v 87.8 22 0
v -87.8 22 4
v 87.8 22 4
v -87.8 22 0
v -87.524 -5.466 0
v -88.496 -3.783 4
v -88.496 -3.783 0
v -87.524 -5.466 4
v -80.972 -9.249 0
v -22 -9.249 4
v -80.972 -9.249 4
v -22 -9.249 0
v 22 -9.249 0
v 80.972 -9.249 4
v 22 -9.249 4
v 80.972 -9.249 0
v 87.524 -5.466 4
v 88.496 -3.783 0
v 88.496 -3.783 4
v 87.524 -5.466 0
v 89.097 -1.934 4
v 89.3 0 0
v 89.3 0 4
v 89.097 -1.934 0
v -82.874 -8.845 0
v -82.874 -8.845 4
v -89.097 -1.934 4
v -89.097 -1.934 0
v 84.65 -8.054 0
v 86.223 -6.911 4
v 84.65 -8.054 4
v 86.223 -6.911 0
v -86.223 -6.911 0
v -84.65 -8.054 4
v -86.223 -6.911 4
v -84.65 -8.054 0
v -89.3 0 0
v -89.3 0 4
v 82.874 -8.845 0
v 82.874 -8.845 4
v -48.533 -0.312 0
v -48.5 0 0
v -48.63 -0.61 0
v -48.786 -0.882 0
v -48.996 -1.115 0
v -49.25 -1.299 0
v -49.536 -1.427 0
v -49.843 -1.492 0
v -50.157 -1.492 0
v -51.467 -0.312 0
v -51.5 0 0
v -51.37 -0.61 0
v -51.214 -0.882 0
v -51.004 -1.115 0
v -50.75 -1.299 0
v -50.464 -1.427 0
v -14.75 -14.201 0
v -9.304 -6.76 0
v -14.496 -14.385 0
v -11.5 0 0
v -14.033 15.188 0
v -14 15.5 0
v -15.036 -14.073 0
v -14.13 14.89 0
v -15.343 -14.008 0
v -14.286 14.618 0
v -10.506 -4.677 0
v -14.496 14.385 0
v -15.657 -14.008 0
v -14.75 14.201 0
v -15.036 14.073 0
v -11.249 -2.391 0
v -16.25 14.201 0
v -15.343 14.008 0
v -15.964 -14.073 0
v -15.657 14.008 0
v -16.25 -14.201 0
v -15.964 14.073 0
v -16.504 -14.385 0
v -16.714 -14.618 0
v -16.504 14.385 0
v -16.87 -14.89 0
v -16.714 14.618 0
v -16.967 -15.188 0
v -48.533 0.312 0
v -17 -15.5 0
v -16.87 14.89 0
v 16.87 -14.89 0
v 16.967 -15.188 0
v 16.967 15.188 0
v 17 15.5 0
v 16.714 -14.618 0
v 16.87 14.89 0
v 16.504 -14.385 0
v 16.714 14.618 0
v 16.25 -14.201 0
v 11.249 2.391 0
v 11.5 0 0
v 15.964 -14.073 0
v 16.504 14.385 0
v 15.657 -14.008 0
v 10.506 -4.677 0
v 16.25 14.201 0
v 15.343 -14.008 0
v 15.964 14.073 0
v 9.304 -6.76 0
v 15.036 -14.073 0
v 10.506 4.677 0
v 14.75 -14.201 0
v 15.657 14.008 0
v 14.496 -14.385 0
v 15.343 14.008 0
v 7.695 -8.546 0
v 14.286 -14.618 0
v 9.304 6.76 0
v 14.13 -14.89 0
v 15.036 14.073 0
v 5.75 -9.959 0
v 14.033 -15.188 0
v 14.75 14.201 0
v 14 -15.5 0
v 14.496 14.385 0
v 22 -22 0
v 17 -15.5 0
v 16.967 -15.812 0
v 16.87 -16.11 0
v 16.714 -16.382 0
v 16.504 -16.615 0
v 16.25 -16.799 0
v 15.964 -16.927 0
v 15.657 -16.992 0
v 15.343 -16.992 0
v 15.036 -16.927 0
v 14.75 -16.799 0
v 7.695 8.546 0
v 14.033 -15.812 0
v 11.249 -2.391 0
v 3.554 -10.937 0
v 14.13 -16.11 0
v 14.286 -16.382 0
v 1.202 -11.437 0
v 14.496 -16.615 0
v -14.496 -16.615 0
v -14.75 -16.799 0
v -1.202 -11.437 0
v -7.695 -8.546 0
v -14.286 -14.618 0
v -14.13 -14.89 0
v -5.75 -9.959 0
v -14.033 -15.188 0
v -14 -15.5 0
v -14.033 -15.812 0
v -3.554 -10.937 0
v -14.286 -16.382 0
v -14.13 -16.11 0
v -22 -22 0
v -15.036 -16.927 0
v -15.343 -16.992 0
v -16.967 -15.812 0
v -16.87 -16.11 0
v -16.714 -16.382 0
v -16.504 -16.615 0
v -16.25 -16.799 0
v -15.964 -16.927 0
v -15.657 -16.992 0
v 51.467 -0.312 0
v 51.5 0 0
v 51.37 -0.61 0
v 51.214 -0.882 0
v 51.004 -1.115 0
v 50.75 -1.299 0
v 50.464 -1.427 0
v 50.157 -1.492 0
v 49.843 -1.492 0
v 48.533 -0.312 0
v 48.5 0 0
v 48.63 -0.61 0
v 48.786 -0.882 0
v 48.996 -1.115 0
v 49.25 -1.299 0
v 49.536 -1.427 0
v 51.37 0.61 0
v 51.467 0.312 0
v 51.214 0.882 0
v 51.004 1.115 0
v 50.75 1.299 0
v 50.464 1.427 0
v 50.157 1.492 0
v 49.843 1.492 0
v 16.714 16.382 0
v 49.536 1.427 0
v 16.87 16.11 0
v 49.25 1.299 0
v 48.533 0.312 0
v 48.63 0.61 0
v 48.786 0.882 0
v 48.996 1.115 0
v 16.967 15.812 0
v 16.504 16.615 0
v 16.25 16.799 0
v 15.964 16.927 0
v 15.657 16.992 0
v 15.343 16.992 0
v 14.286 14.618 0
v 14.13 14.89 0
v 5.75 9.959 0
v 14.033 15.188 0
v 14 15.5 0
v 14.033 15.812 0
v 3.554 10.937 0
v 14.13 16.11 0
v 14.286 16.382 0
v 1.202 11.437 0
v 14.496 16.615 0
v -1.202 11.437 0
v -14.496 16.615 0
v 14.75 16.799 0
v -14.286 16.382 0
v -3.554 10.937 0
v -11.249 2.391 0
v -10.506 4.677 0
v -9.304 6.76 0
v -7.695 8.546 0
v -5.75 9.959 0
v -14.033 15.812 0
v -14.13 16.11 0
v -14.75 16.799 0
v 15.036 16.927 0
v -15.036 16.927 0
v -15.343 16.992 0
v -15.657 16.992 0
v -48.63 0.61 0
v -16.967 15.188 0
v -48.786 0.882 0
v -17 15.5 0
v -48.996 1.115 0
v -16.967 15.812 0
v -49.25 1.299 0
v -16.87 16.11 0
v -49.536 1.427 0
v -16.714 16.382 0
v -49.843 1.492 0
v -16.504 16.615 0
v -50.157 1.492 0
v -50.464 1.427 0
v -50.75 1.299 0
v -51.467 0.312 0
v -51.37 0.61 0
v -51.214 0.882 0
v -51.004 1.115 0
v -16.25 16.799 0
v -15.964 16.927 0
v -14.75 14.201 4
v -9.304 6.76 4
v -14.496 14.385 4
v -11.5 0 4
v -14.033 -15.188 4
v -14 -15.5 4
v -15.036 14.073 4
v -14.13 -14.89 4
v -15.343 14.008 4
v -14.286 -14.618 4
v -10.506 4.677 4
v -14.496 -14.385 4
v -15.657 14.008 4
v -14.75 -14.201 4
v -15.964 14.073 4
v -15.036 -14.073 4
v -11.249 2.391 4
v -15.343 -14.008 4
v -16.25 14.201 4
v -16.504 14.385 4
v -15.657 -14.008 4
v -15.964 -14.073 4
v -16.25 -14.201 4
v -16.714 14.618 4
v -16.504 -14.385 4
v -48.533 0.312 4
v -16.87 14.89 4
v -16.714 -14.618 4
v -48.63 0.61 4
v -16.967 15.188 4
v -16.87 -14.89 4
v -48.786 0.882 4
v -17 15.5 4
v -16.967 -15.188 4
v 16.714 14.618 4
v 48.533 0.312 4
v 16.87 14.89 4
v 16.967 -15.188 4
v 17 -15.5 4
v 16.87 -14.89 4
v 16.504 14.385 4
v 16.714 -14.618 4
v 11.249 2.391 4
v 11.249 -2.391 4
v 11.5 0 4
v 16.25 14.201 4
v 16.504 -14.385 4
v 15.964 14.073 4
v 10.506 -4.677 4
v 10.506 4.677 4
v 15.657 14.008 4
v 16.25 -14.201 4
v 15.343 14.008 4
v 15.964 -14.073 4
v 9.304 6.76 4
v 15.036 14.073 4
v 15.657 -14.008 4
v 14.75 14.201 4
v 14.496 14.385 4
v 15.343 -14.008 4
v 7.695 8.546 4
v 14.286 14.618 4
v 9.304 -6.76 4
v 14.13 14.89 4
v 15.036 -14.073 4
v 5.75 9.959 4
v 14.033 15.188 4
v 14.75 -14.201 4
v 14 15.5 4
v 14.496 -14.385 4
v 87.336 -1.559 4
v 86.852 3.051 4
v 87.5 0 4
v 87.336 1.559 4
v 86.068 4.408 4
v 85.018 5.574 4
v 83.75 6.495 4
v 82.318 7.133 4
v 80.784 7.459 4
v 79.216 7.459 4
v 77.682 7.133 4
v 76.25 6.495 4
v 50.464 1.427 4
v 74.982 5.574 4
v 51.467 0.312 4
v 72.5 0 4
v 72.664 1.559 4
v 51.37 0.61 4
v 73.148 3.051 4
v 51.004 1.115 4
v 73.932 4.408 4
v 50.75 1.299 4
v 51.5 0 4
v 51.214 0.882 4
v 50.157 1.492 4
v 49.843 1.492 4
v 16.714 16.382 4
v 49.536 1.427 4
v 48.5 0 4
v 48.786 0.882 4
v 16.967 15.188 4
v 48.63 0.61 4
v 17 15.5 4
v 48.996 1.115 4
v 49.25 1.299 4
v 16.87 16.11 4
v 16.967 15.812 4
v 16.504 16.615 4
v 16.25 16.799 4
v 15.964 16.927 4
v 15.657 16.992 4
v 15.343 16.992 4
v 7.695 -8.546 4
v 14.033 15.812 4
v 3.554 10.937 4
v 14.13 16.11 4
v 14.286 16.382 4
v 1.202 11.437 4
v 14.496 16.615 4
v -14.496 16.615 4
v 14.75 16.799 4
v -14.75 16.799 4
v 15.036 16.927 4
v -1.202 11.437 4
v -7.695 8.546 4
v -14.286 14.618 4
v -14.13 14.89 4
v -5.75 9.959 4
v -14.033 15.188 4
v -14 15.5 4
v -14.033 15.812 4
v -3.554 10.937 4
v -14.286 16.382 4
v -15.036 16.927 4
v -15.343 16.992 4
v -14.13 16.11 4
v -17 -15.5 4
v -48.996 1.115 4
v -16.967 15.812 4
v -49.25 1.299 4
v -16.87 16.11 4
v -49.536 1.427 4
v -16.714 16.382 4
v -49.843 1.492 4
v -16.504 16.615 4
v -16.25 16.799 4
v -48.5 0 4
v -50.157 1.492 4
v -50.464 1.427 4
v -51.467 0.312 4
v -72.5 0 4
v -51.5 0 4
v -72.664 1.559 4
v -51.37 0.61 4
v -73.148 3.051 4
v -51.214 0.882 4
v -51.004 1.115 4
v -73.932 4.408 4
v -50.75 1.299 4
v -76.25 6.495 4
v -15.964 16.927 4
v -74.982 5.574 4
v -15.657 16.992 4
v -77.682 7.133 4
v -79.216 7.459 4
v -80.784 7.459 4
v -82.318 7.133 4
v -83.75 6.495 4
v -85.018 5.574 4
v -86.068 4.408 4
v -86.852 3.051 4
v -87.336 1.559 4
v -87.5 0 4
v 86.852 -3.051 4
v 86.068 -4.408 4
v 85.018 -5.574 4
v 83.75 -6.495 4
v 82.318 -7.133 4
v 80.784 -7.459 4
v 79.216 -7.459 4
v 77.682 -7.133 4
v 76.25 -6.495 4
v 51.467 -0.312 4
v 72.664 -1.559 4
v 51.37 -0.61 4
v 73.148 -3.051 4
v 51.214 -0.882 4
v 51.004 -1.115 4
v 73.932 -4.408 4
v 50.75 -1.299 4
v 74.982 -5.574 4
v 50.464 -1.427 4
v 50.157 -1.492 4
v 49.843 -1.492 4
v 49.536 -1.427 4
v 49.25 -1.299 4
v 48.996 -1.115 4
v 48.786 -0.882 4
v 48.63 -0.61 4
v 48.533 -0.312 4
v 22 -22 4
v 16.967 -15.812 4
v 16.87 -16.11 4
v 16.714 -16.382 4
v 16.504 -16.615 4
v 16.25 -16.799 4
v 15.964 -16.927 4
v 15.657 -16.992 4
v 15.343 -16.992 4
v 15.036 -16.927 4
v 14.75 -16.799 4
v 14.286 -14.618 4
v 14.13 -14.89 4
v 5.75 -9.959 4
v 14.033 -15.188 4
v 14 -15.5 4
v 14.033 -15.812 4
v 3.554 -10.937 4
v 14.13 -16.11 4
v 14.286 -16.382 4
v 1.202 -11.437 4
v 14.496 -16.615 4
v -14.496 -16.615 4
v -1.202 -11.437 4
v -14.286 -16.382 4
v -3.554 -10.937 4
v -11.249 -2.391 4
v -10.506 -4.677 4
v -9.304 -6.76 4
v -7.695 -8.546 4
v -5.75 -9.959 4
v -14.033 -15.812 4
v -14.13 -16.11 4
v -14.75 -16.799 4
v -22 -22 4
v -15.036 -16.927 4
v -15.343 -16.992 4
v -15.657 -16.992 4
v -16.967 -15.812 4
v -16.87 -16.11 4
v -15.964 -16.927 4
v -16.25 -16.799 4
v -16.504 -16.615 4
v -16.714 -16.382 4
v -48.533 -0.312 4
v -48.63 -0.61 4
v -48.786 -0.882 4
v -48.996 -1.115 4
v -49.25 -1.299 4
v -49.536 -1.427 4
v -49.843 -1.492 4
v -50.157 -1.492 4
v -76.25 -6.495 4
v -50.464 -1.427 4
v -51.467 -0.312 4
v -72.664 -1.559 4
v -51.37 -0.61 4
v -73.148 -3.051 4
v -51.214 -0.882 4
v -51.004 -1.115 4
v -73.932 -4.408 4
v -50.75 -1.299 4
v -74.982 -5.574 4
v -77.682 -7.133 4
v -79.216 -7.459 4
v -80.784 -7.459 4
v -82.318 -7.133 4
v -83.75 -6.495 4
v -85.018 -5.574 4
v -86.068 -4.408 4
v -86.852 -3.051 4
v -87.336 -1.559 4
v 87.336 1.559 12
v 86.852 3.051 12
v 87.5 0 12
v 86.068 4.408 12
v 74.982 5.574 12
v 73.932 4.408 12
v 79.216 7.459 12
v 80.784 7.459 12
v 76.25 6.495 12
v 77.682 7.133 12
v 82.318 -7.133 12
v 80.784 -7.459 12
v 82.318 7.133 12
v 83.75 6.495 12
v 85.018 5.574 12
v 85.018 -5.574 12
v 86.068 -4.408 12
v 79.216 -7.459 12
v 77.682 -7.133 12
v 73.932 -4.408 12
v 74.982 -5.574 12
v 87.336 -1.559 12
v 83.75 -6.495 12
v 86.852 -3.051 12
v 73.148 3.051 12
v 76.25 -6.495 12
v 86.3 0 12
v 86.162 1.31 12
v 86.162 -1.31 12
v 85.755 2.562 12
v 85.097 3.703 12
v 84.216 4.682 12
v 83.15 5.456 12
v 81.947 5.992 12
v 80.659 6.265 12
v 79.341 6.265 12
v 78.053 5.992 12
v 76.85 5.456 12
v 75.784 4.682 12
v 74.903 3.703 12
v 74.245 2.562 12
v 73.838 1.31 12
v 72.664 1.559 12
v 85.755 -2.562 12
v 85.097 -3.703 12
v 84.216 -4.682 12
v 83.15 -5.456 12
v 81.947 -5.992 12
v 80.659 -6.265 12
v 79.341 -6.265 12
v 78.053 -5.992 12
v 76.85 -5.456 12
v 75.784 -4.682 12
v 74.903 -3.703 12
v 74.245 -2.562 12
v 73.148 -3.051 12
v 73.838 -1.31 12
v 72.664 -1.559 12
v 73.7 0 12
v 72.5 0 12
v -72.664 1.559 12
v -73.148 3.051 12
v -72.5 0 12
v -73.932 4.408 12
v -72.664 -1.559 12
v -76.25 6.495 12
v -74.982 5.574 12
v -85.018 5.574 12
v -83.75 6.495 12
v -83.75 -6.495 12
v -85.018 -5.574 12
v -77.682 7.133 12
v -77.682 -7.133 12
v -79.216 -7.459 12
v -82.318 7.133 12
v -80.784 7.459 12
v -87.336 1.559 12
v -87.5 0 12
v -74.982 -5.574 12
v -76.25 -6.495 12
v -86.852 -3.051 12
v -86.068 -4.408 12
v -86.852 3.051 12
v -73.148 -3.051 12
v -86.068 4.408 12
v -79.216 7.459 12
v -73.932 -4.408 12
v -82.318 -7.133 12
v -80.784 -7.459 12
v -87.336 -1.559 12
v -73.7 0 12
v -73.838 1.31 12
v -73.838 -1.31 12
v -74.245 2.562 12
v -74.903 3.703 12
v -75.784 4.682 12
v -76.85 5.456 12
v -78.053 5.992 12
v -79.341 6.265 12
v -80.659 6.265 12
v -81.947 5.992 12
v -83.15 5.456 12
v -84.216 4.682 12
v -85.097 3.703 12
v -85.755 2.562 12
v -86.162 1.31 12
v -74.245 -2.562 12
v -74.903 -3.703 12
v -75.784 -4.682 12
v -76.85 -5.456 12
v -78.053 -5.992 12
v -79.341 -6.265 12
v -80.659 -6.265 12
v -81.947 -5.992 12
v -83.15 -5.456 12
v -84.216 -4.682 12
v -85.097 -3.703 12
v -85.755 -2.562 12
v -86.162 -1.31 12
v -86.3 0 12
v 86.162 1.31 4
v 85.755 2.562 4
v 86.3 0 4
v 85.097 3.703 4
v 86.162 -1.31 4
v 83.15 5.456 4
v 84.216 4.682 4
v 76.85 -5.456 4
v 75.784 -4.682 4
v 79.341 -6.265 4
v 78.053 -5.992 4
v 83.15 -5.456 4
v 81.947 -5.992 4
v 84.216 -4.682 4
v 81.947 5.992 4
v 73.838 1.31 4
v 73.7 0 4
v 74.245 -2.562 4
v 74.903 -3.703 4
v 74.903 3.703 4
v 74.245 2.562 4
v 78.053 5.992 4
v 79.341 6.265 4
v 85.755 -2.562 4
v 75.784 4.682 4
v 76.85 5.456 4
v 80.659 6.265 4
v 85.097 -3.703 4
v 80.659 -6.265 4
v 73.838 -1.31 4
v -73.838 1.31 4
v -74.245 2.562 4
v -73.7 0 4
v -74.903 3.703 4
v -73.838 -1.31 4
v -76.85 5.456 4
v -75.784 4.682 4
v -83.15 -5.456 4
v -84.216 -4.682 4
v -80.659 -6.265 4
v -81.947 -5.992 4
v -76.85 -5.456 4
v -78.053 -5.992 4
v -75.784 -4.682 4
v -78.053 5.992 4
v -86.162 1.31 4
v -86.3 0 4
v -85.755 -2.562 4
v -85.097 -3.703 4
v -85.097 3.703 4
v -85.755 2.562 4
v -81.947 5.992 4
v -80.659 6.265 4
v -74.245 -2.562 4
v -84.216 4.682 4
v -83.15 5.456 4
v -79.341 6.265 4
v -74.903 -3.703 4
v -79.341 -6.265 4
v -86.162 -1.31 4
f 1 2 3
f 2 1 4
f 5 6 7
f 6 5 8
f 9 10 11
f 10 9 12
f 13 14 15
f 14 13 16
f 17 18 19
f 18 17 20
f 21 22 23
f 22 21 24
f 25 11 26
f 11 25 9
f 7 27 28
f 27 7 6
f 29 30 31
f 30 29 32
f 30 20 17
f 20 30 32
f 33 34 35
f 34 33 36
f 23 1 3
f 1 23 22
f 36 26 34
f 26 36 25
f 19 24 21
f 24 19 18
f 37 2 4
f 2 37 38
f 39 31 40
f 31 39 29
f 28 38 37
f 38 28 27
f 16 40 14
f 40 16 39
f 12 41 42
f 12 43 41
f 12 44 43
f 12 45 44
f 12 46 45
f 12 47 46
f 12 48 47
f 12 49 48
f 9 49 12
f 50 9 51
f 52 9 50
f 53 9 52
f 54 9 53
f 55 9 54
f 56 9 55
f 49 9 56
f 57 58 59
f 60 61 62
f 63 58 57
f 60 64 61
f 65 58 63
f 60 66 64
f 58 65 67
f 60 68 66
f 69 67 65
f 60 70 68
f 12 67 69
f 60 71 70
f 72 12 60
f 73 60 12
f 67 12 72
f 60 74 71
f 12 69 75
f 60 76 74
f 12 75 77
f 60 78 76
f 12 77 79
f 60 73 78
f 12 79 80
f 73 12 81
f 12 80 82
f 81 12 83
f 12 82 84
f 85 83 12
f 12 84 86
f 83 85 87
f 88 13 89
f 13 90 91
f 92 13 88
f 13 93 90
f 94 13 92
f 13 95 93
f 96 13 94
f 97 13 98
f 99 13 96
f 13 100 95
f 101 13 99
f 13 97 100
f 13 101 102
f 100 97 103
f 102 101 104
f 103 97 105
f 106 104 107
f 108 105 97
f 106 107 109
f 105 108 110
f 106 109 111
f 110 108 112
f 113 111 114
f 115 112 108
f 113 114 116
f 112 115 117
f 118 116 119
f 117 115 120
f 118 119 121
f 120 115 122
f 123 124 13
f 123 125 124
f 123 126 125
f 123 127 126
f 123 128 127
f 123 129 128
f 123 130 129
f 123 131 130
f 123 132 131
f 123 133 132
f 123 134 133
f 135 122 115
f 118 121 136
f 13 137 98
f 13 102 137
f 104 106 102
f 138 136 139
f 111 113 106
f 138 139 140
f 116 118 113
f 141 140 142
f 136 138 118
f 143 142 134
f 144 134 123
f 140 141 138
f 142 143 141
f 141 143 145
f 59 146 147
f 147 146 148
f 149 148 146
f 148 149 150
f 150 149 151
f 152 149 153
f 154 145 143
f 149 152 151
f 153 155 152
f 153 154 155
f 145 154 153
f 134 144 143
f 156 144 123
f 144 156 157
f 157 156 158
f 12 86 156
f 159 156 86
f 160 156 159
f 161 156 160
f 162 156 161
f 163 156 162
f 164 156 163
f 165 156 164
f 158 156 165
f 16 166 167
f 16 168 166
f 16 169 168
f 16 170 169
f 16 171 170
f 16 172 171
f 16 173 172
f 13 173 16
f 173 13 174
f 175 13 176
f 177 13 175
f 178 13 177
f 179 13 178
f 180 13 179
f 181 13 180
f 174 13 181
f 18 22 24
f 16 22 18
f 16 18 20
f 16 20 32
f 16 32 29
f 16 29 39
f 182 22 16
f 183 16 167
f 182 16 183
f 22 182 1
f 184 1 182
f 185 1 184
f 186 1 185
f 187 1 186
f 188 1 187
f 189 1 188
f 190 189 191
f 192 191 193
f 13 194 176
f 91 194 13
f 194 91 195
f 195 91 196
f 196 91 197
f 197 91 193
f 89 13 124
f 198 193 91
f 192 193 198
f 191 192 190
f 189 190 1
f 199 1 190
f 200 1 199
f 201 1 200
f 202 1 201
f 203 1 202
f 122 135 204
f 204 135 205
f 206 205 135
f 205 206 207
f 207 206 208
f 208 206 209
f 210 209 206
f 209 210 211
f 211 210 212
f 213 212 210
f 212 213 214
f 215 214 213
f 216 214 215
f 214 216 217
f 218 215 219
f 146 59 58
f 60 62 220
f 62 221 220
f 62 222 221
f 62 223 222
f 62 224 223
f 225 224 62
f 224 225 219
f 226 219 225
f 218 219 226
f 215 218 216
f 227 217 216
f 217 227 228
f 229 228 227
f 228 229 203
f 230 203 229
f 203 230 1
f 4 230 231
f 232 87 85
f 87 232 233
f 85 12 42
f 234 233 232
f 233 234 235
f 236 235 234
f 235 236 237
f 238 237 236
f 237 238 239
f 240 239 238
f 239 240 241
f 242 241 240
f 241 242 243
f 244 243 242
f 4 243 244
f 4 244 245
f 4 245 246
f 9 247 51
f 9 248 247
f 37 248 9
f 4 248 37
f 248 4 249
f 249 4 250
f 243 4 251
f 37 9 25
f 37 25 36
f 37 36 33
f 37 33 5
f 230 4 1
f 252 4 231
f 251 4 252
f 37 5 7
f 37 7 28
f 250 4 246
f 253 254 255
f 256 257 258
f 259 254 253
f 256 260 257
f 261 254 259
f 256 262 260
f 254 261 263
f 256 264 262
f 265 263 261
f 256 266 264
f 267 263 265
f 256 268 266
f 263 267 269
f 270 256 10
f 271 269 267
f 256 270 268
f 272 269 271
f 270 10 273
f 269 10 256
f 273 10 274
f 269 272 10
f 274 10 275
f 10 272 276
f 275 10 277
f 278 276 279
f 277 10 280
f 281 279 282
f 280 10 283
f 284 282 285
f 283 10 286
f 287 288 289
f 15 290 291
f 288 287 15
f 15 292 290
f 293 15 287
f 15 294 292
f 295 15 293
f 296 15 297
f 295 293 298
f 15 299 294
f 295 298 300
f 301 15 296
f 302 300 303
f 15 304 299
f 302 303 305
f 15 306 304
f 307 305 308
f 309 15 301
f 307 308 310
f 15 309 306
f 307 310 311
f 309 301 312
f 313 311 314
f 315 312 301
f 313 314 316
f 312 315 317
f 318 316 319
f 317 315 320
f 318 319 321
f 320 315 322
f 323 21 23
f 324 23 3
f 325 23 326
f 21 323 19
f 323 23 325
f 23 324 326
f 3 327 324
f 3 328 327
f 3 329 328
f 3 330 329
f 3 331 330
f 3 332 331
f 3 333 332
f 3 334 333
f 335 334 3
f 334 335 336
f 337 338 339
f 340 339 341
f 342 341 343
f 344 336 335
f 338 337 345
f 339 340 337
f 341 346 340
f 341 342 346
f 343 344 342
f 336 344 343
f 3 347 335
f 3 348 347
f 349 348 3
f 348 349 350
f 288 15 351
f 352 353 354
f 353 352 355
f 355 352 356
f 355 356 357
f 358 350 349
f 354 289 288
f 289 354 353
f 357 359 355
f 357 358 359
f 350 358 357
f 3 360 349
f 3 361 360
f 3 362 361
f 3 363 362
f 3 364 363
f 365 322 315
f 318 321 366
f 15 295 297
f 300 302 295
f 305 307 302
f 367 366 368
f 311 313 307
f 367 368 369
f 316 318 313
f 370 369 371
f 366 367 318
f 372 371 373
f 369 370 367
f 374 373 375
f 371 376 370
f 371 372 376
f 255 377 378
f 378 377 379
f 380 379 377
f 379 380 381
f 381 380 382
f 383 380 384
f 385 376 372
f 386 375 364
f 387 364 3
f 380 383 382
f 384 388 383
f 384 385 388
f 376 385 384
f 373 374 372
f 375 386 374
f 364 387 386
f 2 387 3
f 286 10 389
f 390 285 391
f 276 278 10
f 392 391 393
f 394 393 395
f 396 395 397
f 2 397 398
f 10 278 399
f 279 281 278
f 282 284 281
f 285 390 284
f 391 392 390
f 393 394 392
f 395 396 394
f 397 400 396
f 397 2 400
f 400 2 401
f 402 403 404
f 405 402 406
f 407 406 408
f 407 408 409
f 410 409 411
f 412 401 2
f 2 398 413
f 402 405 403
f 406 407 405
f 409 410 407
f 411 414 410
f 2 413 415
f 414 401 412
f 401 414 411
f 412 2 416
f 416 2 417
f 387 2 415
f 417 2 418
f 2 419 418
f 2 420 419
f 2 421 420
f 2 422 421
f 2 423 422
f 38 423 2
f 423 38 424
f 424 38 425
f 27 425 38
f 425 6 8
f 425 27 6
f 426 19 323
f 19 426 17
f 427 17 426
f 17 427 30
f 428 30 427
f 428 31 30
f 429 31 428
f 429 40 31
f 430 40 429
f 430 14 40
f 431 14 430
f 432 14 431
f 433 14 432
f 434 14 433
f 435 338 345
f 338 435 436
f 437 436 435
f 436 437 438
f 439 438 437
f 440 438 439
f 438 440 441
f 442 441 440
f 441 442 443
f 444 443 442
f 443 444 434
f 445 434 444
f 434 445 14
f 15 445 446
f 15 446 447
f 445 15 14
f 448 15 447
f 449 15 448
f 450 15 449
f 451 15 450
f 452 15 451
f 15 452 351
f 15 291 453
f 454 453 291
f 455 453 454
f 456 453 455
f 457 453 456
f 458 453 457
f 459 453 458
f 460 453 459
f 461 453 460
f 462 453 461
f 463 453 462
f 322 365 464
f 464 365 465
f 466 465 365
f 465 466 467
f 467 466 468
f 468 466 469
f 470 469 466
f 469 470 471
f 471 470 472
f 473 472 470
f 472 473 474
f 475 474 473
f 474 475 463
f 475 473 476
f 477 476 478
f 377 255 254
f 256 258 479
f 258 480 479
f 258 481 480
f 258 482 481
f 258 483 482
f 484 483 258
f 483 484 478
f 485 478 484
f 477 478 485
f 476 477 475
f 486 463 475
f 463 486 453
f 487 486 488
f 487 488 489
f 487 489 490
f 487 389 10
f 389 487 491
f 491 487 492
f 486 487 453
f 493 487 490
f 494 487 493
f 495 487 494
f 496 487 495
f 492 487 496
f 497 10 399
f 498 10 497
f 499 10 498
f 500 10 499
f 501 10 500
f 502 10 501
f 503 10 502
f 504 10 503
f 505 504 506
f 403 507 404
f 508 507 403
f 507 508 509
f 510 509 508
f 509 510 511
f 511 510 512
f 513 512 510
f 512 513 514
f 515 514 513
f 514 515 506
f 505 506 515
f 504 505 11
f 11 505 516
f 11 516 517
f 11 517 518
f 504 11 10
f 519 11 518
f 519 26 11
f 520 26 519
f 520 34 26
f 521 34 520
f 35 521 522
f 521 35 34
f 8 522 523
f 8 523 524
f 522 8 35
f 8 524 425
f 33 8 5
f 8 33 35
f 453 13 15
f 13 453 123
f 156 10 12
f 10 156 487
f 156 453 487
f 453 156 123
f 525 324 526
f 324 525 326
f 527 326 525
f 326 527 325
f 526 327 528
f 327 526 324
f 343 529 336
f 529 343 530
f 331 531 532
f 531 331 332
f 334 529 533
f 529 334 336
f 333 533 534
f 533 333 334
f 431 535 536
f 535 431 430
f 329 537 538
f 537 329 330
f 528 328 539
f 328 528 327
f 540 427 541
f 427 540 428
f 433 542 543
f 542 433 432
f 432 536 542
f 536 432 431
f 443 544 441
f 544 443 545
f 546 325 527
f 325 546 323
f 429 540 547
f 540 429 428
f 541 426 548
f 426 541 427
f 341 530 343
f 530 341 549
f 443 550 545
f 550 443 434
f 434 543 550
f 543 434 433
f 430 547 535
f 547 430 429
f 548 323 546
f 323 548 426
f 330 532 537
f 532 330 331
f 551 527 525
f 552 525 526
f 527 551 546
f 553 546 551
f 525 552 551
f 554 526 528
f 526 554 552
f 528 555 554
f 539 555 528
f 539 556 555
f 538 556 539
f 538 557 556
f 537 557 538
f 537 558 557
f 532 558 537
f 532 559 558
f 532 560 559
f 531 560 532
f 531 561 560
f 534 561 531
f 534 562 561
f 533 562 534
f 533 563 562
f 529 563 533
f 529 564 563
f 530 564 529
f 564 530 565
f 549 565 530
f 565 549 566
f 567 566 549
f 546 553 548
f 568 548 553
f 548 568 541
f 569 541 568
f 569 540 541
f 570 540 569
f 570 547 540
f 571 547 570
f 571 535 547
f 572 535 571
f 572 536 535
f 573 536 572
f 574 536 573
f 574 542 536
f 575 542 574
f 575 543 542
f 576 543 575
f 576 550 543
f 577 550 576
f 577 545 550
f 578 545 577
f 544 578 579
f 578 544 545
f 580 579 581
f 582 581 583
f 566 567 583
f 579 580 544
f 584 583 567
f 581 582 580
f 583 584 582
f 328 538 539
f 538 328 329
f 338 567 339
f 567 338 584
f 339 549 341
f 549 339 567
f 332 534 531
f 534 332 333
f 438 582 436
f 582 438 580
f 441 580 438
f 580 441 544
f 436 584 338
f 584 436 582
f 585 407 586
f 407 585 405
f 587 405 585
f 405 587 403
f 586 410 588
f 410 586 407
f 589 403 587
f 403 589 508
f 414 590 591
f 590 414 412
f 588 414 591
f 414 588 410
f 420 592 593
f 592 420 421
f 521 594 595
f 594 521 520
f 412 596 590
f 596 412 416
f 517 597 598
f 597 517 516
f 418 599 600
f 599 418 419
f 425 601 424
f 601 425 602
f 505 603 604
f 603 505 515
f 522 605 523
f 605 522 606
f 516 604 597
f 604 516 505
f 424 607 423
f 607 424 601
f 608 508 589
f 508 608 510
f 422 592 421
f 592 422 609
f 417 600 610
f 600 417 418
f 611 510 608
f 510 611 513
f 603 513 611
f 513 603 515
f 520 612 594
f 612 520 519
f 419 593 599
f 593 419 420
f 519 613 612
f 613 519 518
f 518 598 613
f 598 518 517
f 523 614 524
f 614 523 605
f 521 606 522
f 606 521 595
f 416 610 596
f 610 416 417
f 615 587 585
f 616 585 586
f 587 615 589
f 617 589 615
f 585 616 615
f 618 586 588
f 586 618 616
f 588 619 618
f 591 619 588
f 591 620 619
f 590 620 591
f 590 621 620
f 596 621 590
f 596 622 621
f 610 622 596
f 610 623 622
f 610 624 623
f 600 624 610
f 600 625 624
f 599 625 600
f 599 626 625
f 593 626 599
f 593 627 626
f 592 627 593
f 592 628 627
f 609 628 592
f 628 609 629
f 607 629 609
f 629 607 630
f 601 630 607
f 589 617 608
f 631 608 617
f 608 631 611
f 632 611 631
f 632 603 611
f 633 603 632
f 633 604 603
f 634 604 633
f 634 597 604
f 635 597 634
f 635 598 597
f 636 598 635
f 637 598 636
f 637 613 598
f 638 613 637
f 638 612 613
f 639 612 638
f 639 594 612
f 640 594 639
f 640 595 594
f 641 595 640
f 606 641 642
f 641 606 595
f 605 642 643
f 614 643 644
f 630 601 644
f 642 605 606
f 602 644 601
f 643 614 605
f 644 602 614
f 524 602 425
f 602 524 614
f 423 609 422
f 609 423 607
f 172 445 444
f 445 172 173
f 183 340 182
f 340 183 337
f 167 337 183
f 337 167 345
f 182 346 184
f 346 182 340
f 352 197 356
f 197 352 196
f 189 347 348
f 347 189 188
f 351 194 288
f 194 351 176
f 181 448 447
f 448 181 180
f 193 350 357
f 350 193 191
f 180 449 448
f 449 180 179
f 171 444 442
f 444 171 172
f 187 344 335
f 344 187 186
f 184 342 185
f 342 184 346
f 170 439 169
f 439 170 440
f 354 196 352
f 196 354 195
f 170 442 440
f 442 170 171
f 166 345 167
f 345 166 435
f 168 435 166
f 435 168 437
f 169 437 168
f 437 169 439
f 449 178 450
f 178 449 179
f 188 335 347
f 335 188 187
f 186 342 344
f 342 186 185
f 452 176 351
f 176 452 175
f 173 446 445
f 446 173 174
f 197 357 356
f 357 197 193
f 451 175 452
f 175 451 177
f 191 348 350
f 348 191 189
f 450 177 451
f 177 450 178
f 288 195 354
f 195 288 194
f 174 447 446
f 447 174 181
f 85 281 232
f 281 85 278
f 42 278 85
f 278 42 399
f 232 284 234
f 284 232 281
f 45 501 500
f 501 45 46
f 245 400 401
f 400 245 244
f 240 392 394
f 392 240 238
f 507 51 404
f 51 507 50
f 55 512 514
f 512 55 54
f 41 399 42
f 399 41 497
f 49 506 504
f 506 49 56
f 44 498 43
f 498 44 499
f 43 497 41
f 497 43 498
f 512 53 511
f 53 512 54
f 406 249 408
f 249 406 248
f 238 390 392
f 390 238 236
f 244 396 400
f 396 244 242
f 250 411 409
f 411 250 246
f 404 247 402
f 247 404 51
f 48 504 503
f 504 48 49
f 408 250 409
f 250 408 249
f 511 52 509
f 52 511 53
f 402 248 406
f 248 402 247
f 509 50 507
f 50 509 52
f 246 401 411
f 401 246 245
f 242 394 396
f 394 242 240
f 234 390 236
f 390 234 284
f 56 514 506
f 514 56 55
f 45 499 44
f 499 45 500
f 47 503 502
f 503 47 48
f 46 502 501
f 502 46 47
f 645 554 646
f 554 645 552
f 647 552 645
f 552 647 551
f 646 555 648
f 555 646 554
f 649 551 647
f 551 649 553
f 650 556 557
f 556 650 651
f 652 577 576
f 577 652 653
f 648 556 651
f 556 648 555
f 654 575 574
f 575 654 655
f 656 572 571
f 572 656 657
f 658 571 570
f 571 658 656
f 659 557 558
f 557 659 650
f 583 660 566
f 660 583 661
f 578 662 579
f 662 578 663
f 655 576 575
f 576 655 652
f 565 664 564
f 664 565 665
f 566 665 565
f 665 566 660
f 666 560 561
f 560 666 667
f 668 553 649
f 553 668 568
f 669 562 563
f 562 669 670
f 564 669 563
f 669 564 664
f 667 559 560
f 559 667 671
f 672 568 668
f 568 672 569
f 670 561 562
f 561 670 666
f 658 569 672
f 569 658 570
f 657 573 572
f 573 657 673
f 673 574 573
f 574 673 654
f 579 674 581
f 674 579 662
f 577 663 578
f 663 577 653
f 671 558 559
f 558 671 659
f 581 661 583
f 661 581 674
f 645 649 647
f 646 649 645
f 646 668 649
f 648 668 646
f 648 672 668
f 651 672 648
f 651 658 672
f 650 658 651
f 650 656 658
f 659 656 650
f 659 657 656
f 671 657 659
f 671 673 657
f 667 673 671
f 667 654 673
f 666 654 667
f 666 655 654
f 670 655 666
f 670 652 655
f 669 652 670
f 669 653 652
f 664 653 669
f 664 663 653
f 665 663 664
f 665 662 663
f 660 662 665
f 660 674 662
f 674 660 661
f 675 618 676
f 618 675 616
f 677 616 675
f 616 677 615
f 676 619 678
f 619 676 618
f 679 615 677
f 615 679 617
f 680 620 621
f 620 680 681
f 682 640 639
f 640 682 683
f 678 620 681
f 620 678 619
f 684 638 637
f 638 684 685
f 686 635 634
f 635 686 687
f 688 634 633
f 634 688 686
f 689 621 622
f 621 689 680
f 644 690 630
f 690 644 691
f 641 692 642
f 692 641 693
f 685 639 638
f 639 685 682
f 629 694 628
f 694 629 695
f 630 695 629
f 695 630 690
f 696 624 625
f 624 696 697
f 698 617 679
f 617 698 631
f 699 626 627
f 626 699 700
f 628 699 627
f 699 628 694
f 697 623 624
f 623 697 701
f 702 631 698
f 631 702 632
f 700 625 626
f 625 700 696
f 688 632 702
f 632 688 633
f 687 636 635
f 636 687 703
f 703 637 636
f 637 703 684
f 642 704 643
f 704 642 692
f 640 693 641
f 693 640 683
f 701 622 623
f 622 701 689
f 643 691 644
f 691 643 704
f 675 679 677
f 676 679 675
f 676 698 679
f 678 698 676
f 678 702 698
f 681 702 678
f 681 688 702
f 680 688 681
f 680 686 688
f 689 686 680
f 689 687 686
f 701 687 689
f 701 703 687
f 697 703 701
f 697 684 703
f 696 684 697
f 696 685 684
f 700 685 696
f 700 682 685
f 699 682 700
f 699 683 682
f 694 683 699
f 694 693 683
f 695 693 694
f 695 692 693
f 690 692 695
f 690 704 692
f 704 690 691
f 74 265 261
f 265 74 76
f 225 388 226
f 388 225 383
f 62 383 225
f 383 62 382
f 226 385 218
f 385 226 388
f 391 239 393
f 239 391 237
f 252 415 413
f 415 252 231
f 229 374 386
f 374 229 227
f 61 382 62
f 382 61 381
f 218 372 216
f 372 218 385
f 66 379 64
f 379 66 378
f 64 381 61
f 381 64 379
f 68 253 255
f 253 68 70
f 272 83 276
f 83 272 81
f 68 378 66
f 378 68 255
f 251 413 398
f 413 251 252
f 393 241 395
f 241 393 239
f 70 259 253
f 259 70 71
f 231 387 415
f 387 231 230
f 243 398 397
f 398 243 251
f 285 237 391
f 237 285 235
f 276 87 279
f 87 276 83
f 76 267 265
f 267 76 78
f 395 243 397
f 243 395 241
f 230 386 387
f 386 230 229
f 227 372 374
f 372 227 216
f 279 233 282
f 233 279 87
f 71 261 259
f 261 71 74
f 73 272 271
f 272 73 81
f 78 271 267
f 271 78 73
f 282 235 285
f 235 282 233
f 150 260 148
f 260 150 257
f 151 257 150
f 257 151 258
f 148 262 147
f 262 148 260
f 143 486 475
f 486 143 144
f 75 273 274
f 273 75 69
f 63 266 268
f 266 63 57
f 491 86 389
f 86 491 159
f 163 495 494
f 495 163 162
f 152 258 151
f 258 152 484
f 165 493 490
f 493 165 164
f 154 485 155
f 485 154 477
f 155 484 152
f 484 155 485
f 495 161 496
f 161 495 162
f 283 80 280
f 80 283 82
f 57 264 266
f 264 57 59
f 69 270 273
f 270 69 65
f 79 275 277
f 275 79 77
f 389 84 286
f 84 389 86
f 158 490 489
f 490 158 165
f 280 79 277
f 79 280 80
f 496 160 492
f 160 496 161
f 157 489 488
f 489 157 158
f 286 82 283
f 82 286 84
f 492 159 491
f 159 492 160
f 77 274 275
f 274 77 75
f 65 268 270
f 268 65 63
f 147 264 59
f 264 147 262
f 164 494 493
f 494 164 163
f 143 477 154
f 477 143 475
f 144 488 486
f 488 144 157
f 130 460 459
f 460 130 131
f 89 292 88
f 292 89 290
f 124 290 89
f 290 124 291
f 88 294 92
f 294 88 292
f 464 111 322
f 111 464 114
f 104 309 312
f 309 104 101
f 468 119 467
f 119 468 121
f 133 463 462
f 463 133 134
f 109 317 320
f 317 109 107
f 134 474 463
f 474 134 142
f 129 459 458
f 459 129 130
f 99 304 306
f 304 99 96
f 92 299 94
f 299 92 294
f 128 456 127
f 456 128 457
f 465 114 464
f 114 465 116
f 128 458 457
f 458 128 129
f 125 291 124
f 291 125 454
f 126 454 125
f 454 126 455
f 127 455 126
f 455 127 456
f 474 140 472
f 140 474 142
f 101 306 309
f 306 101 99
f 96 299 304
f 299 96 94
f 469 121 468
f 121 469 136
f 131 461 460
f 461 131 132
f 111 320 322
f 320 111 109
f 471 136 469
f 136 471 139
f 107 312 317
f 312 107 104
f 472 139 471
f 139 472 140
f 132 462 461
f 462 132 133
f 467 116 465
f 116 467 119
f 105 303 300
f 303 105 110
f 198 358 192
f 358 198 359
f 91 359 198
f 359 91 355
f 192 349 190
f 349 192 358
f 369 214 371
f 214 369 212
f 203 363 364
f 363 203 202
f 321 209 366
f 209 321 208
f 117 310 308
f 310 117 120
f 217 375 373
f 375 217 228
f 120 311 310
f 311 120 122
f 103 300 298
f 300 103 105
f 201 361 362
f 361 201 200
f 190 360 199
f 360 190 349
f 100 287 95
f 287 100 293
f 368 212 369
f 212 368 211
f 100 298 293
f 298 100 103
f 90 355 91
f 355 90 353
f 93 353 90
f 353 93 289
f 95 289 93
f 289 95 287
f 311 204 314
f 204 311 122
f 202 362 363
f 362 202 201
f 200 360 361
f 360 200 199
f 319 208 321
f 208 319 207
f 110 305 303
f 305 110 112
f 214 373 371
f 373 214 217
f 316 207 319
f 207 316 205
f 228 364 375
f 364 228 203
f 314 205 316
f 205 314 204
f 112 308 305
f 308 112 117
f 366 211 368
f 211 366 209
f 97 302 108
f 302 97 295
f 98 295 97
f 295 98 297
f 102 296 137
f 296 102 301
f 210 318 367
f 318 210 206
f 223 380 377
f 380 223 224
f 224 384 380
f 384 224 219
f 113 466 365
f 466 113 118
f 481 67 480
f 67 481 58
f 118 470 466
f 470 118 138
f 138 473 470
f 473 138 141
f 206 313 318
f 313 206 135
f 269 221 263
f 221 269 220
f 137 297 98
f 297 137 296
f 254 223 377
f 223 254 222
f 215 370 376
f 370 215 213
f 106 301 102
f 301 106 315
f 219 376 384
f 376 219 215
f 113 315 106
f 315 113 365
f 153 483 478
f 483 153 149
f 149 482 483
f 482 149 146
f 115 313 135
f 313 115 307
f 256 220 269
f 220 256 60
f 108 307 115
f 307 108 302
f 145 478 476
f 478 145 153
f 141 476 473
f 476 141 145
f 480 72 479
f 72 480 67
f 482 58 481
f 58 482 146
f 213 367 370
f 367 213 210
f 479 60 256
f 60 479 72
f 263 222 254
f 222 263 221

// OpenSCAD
z_mellan = 160;
z_y = 22;
z_d = 12.6;
z_hole = 15;

nema_xy = 44;
nema_screw = 31;

screw = 3;
screw_distance = 100;
wall = 3;
h = 4;
ply = 8;

difference() {
    union() {
        difference() {
            
        }
        hull() {
            translate([z_mellan/2,0,0]) cylinder(d=z_d+wall*2, h=h, $fn=30);
            translate([-z_mellan/2,0,0]) cylinder(d=z_d+wall*2, h=h, $fn=30);
            
            translate([-z_mellan/2-wall/2-z_d/2,0,0]) cube([z_mellan+wall+z_d,z_y,h]);
            
        }
        //nema platta
        translate([-nema_xy/2,-nema_xy/2,0]) cube([nema_xy, nema_xy, h]);
        //uppstickande hål
        translate([z_mellan/2,0,0]) cylinder(d=z_hole, h=h+ply, $fn=30);
        translate([-z_mellan/2,0,0]) cylinder(d=z_hole, h=h+ply, $fn=30);
    }
    translate([screw_distance/2,0,-1]) cylinder(d=screw, h=h*3, $fn=30);
    translate([-screw_distance/2,0,-1]) cylinder(d=screw, h=h*3, $fn=30);
    translate([z_mellan/2,0,h]) cylinder(d=z_d, h=h*3+ply, $fn=30);
    translate([-z_mellan/2,0,h]) cylinder(d=z_d, h=h*3+ply, $fn=30);
    
    //nema hål
    translate([-nema_screw/2,nema_screw/2,-1]) cylinder(d=screw, h=h*3, $fn=30);
    translate([-nema_screw/2,-nema_screw/2,-1]) cylinder(d=screw, h=h*3, $fn=30);
    translate([nema_screw/2,-nema_screw/2,-1]) cylinder(d=screw, h=h*3, $fn=30);
    translate([nema_screw/2,nema_screw/2,-1]) cylinder(d=screw, h=h*3, $fn=30);
    translate([0,0,-1]) cylinder(d=23, h=h*3, $fn=30);
}
